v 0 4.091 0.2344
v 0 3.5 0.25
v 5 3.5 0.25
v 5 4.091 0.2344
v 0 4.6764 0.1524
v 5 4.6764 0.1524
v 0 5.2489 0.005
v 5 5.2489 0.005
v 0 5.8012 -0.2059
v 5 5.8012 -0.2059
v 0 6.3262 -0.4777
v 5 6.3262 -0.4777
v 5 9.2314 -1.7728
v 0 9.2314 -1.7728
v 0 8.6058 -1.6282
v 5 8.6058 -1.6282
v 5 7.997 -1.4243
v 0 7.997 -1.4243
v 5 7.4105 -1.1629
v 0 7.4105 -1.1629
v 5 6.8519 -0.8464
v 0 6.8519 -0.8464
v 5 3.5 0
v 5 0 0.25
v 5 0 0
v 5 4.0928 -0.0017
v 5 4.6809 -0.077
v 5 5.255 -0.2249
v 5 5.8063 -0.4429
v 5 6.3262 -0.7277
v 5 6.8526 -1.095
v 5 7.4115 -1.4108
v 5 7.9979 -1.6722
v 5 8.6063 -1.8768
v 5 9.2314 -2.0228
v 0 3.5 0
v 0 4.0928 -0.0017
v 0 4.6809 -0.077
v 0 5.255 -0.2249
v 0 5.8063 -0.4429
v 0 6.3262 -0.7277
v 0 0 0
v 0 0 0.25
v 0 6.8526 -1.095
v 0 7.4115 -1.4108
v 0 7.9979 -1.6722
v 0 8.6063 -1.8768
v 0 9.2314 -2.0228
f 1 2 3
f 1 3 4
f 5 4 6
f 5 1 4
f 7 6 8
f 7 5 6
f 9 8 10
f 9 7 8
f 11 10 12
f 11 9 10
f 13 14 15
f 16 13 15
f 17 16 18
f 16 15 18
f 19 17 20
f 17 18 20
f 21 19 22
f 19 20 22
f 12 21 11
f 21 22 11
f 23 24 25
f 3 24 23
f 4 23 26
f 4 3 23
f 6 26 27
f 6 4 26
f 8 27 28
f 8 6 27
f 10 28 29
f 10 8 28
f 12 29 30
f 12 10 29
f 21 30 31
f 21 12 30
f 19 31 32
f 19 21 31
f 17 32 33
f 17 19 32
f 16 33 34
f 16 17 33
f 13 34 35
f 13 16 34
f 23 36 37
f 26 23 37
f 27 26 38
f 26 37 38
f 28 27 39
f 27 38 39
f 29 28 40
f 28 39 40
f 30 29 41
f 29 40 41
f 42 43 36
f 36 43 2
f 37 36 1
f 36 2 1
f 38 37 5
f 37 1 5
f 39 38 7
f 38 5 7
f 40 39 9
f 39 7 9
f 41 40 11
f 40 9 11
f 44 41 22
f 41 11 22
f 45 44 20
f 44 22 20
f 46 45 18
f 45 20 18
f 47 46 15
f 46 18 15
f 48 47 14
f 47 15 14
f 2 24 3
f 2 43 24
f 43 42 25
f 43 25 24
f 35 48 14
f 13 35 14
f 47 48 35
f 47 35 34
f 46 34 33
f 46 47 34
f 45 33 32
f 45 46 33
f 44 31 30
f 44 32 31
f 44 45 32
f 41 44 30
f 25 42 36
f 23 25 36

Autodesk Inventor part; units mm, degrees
ref_plane "YZ Plane" through (0, 0, 0) normal (1, 0, 0) x (0, 1, 0)
ref_plane "XZ Plane" through (0, 0, 0) normal (0, 1, 0) x (-1, 0, 0)
ref_plane "XY Plane" through (0, 0, 0) normal (0, 0, 1) x (1, 0, 0)
sketch "Sketch1" plane through (0, 0, 0) normal (1, 0, 0) x (0, 1, 0)
  line L0 (0, 0) -> (3.5, 0)
  arc A0 (6.3262, -0.7277) -> (3.5, 0) centre (3.7831, -4.7528) ccw
  arc A1 (6.3262, -0.7277) -> (9.2314, -2.0228) centre (10.456, 4.6303) ccw
  line L1 (0, 0) -> (0, 0.25)
  line L2 (0, 0.25) -> (3.5, 0.25)
  line L3 (6.3262, -0.7277) -> (6.3262, -0.4777)
  line L4 (9.2314, -2.0228) -> (9.2314, -1.7728)
  arc A2 (6.3262, -0.4777) -> (3.5, 0.25) centre (3.658, -4.9886) ccw
  arc A3 (6.3262, -0.4777) -> (9.2314, -1.7728) centre (10.4213, 4.8026) ccw
  dimension "d0" = 3.5
  dimension "d1" = 0.25
  dimension "d2" = 3.5
  dimension "d3" = 0.25
  dimension "d4" = 0.25
extrude "Extrusion1" add sketch "Sketch1" along normal blind 5
properties part number "ribbonCable"
